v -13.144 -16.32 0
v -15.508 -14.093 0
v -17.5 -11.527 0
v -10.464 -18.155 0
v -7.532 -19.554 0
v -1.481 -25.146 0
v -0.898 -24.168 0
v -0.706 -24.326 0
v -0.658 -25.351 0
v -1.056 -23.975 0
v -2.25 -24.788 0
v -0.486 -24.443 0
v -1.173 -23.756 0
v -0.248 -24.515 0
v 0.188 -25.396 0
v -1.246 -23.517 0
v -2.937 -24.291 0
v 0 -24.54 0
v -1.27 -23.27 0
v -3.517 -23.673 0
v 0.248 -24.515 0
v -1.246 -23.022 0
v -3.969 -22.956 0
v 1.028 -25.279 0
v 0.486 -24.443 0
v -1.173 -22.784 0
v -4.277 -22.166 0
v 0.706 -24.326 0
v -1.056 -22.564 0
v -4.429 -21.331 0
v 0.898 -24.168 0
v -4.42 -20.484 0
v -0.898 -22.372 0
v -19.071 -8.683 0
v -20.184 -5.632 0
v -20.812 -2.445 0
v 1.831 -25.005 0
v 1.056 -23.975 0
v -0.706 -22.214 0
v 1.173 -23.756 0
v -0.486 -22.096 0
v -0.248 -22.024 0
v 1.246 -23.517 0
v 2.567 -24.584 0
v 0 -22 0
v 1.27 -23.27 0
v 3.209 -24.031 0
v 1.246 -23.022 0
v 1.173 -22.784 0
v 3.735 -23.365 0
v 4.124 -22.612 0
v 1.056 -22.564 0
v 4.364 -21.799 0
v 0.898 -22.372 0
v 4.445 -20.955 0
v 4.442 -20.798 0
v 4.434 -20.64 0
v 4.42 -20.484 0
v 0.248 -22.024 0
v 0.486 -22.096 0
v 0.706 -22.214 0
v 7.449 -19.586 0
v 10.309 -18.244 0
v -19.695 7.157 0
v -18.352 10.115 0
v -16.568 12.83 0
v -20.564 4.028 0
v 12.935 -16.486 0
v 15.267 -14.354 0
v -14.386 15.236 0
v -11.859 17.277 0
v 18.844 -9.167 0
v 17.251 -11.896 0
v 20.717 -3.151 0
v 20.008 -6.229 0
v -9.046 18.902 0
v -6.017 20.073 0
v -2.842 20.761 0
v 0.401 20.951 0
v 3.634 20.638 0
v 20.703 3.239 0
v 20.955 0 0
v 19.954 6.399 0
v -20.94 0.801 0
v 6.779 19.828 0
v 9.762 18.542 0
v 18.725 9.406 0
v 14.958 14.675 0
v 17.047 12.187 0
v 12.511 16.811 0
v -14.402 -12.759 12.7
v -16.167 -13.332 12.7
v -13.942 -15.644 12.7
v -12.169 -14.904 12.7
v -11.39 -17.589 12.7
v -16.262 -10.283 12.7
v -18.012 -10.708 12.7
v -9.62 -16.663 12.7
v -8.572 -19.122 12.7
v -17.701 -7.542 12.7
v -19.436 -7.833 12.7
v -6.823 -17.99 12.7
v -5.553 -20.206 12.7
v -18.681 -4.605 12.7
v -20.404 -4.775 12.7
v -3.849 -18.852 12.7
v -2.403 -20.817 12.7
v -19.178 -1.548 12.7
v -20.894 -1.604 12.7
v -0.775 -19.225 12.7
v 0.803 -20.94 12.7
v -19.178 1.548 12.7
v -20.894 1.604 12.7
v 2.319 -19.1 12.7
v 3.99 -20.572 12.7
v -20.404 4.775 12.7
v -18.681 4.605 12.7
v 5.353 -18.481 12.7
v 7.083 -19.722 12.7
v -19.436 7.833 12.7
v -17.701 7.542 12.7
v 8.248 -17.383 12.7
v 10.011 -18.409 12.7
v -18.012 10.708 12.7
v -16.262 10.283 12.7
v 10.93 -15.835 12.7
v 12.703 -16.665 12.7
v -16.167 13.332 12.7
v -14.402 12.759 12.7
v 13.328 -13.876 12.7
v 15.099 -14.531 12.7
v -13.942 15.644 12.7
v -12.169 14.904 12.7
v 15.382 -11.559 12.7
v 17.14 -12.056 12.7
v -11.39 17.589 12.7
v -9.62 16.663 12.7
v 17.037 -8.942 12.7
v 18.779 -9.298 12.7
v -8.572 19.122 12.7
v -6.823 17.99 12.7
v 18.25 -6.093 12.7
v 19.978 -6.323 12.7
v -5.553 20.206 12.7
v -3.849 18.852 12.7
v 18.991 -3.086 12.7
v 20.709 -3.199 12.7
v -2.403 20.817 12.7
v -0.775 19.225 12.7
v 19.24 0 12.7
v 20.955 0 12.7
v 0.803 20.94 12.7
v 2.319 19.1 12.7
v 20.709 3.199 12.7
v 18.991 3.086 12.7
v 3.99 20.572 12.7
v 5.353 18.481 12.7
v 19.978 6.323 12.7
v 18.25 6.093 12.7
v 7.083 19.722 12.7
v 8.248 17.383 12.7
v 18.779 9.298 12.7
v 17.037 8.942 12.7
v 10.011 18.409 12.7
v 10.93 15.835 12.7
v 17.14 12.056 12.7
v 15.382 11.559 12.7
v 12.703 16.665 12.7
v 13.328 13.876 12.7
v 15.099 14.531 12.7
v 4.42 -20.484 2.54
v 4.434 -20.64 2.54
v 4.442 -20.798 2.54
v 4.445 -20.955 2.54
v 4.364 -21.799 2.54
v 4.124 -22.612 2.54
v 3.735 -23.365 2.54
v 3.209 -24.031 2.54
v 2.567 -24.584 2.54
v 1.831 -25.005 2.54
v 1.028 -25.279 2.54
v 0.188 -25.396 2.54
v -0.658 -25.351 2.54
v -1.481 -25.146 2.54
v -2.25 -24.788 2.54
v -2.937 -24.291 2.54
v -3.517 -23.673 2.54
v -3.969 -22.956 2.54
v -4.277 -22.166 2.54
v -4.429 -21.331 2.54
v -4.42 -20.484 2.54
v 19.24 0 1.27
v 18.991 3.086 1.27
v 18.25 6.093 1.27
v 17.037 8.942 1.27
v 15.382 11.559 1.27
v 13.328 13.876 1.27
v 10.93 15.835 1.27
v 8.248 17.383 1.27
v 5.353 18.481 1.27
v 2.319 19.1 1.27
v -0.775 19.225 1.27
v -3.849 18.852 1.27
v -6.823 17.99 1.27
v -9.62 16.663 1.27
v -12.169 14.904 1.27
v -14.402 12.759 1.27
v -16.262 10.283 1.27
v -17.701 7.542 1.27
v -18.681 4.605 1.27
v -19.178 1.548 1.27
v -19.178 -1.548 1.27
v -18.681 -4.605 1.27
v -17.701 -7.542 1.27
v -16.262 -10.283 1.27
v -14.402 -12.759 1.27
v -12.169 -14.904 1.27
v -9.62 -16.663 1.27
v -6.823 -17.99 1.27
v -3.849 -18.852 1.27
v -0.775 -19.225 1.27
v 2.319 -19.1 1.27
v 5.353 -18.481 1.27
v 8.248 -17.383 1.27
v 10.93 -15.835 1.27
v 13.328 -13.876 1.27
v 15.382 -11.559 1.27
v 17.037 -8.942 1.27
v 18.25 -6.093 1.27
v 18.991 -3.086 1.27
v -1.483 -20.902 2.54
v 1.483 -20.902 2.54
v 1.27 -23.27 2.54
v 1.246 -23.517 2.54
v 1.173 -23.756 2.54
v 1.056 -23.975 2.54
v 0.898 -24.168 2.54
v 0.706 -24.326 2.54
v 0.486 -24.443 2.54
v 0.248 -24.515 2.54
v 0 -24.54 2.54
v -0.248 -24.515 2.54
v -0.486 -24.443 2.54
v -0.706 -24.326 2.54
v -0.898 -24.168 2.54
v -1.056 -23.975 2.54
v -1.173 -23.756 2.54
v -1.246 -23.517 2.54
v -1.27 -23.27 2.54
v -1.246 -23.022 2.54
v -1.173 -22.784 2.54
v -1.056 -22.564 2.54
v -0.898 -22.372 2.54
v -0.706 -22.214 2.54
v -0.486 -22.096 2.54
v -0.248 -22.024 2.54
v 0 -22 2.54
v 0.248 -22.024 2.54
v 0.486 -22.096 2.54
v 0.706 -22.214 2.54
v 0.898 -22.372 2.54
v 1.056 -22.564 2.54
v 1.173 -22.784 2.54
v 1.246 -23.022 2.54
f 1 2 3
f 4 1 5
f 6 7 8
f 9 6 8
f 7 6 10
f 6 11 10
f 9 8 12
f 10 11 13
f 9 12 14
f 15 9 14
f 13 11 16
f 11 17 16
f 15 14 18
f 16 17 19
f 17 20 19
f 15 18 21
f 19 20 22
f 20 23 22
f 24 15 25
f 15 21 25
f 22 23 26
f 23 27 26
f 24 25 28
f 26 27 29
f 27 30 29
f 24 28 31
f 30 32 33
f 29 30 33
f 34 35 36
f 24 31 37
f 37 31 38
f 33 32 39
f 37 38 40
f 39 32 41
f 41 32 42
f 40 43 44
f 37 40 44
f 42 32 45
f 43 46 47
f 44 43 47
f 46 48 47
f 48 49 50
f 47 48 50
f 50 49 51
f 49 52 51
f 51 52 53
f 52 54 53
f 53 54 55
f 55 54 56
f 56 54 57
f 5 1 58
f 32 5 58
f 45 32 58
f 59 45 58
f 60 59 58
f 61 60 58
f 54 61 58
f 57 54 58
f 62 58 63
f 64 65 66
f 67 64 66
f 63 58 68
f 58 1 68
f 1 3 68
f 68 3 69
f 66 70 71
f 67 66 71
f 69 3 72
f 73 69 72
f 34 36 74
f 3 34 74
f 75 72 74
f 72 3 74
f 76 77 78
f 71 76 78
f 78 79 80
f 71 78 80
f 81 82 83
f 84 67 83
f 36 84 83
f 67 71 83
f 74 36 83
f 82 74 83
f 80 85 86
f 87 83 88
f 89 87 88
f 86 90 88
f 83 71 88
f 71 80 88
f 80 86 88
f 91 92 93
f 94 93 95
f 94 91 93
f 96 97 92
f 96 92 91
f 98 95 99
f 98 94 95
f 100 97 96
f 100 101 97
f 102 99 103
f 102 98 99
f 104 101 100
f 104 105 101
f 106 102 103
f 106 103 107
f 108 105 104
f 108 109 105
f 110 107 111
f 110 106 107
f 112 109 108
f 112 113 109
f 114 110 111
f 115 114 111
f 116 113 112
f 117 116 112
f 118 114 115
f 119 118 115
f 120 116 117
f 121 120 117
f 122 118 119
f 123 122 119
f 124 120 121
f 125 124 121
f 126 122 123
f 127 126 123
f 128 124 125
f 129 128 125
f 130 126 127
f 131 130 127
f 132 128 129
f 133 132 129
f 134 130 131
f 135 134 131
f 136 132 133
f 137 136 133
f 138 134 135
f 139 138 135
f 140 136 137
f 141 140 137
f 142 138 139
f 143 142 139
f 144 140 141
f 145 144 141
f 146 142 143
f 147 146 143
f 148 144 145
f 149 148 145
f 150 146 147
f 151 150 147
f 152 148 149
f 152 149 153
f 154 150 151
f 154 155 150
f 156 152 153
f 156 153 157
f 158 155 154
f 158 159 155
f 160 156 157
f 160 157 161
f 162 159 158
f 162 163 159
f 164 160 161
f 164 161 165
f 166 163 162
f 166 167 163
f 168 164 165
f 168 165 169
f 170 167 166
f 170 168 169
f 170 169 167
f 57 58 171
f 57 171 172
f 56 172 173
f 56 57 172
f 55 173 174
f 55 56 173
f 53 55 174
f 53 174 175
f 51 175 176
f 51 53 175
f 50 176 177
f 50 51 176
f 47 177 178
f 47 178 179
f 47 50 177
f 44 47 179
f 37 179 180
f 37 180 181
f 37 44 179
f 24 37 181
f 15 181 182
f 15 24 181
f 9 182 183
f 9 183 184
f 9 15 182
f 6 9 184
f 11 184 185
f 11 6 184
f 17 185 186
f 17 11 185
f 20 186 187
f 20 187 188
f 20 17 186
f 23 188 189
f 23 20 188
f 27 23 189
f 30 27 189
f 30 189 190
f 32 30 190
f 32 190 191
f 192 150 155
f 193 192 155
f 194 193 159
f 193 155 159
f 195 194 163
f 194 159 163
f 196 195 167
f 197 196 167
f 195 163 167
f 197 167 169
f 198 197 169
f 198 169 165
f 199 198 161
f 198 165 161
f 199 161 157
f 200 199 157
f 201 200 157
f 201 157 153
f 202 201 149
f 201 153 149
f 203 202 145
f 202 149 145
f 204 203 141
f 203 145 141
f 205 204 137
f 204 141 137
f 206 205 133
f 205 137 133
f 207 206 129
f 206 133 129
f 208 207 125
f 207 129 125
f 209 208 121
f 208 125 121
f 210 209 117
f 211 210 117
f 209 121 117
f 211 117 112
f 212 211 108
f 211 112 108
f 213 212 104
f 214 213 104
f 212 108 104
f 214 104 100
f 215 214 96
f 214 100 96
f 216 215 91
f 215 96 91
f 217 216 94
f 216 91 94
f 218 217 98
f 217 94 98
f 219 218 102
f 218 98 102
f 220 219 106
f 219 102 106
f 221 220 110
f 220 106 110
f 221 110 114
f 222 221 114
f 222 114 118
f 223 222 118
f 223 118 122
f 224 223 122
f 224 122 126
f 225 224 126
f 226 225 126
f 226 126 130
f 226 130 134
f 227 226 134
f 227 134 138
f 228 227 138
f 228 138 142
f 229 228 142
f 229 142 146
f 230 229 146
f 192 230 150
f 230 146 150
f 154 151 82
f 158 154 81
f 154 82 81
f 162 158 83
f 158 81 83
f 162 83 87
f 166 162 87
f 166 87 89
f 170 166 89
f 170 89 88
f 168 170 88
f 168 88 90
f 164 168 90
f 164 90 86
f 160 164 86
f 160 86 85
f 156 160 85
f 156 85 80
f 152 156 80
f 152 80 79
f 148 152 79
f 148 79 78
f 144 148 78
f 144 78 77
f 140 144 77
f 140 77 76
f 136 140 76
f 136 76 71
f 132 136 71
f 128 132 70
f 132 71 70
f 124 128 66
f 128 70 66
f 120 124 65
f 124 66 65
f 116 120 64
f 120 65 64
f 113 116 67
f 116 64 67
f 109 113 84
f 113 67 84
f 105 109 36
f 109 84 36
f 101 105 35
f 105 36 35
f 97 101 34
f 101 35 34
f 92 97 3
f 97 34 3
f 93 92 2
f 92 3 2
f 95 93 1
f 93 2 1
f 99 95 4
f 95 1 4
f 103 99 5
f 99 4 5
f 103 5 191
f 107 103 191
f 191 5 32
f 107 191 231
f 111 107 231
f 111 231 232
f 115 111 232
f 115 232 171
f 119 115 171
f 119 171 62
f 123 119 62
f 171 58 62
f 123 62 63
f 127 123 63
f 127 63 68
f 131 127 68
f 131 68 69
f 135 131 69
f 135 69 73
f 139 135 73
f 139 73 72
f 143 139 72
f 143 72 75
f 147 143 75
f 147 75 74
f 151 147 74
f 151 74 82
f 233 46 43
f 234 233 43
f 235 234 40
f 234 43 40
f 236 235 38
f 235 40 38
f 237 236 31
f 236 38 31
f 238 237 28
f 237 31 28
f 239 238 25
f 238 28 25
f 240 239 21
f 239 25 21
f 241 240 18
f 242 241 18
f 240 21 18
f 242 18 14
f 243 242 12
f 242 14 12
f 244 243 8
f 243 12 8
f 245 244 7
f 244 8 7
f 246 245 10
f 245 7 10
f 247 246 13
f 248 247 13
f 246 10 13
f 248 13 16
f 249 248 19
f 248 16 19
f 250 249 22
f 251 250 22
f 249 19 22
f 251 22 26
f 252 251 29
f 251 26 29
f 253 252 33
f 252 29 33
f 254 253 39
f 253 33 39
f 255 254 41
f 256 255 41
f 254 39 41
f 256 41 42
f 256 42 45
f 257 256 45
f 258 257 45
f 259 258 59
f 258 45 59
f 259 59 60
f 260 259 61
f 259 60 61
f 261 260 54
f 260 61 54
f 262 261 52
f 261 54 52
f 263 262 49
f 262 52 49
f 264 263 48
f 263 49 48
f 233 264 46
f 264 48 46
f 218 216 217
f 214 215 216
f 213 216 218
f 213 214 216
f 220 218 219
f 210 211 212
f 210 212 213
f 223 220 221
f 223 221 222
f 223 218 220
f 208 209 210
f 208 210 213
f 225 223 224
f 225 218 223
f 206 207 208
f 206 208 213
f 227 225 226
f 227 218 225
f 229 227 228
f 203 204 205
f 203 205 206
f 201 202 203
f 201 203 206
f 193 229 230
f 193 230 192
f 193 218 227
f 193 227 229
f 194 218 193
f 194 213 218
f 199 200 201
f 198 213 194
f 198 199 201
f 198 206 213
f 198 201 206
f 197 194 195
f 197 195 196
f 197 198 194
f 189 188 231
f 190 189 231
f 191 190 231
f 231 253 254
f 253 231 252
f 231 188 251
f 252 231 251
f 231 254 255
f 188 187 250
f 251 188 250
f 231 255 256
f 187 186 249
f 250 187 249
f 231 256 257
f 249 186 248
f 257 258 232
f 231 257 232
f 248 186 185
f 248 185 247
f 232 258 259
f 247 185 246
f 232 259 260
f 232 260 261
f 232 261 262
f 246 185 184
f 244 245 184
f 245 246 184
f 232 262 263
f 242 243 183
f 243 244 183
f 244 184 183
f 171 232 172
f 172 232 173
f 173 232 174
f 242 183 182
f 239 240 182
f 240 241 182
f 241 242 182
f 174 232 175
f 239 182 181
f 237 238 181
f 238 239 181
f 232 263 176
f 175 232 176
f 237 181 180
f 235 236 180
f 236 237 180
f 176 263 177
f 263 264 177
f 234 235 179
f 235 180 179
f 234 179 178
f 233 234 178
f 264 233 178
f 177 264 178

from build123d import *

# Parameters (mm, degrees)
F0_R     = 20.955
F1_DEPTH = 12.7
F2_R     = 19.2405
F3_DEPTH = 11.43
F4_R     = 1.27
F5_DEPTH = 2.54


with BuildPart() as f1:
    # F0 (on Top) → F1 (new body)
    with BuildSketch(Plane.XY):
        Circle(F0_R)
    extrude(amount=F1_DEPTH)

    # F2 (on face) → F3 (cut)
    with BuildSketch(Plane.XY.offset(12.7)):
        Circle(F2_R)
    extrude(amount=-F3_DEPTH, mode=Mode.SUBTRACT)

    # F4 (on face) → F5 (join)
    with BuildSketch(Plane(origin=(0, 0, 0), x_dir=(1, 0, 0), z_dir=(0, 0, -1))):
        with BuildLine():
            ThreePointArc((4.4199287209, 20.4835606061), (4.4387277549, 20.718947214), (4.445, 20.955))
            ThreePointArc((4.445, 20.955), (-0.236052786, 25.3937277549), (-4.4199287209, 20.4835606061))
            ThreePointArc((-4.4199287209, 20.4835606061), (0, 20.955), (4.4199287209, 20.4835606061))
        make_face()
        with Locations((0, 23.2695452869)):
            Circle(F4_R, mode=Mode.SUBTRACT)
    extrude(amount=-F5_DEPTH)


solid = f1.part
